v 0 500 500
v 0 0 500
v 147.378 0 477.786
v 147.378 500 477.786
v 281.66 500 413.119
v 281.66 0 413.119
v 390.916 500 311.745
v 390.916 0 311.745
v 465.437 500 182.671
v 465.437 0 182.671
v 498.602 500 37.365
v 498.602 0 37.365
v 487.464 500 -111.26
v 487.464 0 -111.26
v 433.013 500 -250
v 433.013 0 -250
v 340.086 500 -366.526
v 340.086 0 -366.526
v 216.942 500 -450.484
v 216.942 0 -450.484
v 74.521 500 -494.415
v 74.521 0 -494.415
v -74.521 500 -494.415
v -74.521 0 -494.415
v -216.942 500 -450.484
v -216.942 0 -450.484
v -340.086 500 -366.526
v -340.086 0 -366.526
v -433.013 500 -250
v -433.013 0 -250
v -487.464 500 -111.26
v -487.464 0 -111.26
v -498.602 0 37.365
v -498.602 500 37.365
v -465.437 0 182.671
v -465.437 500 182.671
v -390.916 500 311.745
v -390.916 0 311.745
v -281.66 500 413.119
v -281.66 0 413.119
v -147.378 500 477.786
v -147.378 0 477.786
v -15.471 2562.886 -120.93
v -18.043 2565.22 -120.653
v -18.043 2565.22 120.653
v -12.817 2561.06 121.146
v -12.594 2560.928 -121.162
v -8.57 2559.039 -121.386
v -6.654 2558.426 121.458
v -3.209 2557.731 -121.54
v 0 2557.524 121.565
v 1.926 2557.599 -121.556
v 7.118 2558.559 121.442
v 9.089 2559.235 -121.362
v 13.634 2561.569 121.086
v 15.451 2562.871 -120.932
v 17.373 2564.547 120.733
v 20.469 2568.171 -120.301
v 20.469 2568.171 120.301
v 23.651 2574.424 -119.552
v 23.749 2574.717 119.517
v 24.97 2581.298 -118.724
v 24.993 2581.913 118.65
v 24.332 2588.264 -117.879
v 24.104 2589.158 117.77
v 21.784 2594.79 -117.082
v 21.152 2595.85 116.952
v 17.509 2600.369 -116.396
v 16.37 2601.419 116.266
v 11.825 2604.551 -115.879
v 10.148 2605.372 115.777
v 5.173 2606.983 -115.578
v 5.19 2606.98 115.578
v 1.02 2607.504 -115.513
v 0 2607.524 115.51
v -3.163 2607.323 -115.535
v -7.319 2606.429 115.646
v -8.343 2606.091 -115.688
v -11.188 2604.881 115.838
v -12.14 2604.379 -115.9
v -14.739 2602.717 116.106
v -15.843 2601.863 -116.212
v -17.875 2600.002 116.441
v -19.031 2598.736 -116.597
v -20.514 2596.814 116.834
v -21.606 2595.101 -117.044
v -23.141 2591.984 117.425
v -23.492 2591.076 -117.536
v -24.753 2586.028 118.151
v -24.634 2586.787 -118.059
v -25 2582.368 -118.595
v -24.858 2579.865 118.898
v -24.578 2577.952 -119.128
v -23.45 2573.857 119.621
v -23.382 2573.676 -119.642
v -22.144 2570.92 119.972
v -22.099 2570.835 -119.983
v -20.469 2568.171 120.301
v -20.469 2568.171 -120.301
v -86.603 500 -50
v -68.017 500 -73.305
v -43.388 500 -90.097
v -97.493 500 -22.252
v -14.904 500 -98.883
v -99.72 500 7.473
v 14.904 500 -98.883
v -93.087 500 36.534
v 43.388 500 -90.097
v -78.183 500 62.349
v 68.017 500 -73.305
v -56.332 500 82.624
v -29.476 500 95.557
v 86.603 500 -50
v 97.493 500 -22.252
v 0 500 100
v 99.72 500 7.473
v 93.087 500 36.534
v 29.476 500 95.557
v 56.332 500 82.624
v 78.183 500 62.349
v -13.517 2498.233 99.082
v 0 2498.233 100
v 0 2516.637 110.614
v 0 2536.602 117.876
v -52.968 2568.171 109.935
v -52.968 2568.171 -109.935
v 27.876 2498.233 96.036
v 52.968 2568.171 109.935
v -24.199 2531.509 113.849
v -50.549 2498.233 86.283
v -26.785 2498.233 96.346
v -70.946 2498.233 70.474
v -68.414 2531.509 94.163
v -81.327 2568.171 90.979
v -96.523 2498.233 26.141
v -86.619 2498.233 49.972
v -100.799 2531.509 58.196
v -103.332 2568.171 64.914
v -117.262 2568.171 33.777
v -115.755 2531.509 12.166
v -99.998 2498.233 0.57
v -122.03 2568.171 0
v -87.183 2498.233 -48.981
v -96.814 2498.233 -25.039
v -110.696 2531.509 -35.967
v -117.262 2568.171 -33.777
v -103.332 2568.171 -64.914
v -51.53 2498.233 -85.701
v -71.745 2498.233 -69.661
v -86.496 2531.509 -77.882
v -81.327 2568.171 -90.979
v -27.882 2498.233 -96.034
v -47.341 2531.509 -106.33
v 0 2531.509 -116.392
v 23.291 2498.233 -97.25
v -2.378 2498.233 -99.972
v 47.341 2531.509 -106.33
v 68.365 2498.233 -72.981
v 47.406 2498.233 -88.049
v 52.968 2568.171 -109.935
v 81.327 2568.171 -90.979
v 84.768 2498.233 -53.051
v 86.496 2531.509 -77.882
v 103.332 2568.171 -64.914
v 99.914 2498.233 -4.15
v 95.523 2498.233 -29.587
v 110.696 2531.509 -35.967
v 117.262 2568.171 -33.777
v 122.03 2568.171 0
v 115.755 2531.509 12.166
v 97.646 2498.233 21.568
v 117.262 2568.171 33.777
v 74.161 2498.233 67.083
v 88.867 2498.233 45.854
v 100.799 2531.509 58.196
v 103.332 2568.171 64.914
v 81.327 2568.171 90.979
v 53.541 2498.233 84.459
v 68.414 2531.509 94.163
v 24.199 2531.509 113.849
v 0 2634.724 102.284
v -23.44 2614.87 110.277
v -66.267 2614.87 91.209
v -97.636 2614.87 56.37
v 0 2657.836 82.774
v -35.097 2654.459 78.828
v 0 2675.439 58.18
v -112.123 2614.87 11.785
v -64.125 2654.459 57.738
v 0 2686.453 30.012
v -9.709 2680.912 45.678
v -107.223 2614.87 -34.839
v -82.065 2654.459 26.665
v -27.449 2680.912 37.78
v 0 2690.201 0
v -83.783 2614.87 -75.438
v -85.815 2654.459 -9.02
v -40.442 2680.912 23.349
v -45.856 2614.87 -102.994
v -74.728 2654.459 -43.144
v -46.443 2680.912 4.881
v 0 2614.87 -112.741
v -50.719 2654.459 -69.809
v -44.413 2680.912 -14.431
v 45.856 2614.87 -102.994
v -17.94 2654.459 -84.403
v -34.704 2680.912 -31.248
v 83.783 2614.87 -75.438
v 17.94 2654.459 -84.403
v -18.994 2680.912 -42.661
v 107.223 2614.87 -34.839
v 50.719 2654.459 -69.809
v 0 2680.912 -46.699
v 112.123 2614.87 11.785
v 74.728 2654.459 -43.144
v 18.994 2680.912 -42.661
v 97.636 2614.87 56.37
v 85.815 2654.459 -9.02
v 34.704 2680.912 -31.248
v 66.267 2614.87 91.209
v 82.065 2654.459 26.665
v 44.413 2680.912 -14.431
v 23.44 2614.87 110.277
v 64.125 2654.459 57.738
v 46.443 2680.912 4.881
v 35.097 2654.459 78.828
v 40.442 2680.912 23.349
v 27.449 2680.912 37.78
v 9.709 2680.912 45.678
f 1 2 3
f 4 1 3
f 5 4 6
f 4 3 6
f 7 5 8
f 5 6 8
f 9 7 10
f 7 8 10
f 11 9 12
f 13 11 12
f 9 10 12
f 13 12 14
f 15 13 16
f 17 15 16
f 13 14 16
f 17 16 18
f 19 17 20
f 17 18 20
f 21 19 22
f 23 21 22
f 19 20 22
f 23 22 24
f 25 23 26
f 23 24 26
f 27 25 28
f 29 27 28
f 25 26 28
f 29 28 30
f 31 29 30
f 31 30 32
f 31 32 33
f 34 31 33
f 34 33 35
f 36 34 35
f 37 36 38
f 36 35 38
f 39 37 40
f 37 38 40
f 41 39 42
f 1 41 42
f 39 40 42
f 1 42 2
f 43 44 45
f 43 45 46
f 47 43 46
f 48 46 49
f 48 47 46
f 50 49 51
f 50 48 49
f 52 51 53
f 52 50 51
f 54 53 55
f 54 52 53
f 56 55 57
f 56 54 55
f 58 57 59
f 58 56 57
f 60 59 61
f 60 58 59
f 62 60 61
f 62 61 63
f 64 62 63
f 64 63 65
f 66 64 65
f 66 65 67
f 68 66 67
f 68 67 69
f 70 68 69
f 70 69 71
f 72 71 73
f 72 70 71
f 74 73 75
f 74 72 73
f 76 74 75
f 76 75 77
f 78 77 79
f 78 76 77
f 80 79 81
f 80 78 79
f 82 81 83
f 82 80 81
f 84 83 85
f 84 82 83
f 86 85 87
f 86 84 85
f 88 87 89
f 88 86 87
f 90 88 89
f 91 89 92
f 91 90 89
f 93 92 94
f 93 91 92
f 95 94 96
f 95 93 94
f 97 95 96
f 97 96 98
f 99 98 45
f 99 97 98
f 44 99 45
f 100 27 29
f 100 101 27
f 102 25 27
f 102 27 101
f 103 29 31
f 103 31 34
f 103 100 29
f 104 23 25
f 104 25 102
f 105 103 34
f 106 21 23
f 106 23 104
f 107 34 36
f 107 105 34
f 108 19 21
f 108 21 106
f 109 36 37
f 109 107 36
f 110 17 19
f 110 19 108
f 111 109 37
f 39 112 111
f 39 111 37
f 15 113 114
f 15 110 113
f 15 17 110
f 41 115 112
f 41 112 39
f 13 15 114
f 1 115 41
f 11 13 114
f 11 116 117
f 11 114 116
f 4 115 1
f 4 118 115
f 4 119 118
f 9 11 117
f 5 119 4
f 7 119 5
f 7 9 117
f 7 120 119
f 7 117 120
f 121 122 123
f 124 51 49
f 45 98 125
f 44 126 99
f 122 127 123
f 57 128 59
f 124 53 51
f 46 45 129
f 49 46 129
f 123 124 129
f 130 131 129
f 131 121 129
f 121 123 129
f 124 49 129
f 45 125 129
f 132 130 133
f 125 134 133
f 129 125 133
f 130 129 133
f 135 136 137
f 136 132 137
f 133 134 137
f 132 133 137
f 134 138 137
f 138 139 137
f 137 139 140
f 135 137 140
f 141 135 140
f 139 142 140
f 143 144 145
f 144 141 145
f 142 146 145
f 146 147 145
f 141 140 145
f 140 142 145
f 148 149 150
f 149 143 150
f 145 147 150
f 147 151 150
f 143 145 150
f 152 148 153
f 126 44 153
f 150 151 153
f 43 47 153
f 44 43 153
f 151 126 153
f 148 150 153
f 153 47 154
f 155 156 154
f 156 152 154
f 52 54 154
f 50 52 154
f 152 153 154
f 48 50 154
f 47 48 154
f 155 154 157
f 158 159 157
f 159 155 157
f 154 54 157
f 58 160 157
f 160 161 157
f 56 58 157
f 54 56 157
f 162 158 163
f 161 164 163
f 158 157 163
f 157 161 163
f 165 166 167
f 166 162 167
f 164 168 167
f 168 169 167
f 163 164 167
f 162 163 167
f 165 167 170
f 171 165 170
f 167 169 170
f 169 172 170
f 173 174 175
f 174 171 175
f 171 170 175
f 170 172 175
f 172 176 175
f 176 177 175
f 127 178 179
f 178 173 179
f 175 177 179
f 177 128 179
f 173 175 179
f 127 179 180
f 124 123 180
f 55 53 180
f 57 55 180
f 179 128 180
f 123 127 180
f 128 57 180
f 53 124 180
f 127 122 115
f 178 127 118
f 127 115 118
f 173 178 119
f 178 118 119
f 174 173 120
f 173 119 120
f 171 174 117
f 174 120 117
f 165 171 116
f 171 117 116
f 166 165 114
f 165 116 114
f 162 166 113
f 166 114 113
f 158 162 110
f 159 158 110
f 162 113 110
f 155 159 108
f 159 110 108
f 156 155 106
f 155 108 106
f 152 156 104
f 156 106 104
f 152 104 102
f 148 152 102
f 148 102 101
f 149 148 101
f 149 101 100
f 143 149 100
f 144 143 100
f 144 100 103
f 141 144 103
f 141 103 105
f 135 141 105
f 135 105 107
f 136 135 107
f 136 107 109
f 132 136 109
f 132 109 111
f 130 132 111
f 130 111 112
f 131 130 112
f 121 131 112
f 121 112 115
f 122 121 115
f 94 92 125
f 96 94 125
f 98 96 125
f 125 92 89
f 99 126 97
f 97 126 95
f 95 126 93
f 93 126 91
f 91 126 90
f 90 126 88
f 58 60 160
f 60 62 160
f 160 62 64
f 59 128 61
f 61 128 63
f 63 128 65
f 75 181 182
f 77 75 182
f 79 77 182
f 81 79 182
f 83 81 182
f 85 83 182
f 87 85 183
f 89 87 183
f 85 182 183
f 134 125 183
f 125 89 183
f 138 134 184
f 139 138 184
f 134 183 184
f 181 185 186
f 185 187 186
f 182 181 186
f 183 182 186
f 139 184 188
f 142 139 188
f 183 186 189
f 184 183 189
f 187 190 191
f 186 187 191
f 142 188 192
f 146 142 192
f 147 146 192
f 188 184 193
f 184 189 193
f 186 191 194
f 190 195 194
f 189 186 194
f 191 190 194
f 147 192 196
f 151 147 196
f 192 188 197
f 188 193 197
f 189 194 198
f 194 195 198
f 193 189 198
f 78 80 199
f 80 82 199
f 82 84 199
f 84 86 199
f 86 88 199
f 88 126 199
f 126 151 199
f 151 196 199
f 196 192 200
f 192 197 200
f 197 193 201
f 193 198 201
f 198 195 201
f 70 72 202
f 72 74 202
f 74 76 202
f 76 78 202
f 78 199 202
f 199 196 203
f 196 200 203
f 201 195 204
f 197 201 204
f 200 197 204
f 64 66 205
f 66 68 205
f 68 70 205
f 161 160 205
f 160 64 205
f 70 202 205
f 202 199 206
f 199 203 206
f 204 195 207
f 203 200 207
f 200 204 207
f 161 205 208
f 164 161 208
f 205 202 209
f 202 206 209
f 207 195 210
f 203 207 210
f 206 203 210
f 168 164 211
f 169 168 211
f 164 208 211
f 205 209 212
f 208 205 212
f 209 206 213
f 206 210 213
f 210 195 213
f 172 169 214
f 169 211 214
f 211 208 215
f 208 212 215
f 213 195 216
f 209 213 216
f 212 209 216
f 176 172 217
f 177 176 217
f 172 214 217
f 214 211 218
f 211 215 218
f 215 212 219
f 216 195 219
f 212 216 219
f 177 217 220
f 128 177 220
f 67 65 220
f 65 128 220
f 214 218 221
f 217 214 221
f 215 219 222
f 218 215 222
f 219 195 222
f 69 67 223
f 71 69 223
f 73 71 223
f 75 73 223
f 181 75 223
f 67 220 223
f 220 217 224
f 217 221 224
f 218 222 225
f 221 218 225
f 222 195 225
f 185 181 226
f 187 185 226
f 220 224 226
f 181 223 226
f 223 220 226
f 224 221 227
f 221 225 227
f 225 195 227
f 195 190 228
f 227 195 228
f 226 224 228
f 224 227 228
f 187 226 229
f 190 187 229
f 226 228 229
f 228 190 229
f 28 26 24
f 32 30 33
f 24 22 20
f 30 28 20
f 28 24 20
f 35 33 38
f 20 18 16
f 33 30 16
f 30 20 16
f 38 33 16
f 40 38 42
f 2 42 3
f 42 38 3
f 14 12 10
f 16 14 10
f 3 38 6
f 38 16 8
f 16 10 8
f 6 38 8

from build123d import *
from build123d.topology import SkipClean

# Parameters (mm, degrees)
SKETCH1_R               = 500
BOSS_EXTRUDE1_DEPTH     = 500
SKETCH2_R               = 100
BOSS_EXTRUDE2_DEPTH     = 2000
CUT_EXTRUDE1_DEPTH      = 164
CUT_EXTRUDE1_DEPTH_BACK = 147
SKETCH5_R               = 25


with BuildPart() as part:
    # Sketch1 → Boss-Extrude1 (new body)
    with BuildSketch(Plane(origin=(0, 0, 0), x_dir=(1, 0, 0), z_dir=(0, 1, 0))):
        with Locations(Location((0, 0, 0), (0, 0, 270))):
            Circle(SKETCH1_R)
    extrude(amount=BOSS_EXTRUDE1_DEPTH)

    # Sketch2 → Boss-Extrude2 (add)
    with BuildSketch(Plane(origin=(0, 500, 0), x_dir=(1, 0, 0), z_dir=(0, 1, 0))):
        with Locations(Location((0, 0, 0), (0, 0, 270))):
            Circle(SKETCH2_R)
    extrude(amount=BOSS_EXTRUDE2_DEPTH)

    # Sketch4 → Revolve3 (revolve)
    with SkipClean():  # the faces are left unmerged after this step: merging them gives an invalid solid
        with BuildSketch(Plane.XY, mode=Mode.PRIVATE) as revolve3_sk:
            with BuildLine():
                ThreePointArc((122.029891086, 2568.171222464), (86.288163494, 2654.459385958), (0, 2690.20111355))
                Line((0, 2690.20111355), (0, 2446.141331378))
                ThreePointArc((0, 2446.141331378), (86.288163494, 2481.883058969), (122.029891086, 2568.171222464))
            make_face()
            with BuildLine():
                Line((0, 2446.141331378), (0, 2690.20111355))
                ThreePointArc((0, 2690.20111355), (-122.029891086, 2568.171222464), (0, 2446.141331378))
            make_face()
        revolve(revolve3_sk.sketch.rotate(Axis((0, 2690.20111355, 0), (0, -1, 0)), 90), axis=Axis((0, 2690.20111355, 0), (0, -1, 0)))

    # Sketch5 → Cut-Extrude1 (cut, two sides: drawn at the far end of the back side and taken through both)
    with BuildSketch(Plane.XY.offset(-CUT_EXTRUDE1_DEPTH_BACK)):
        with Locations(Location((0, 2582.524351177, 0), (0, 0, 223.802603959))):
            Circle(SKETCH5_R)
    extrude(amount=CUT_EXTRUDE1_DEPTH + CUT_EXTRUDE1_DEPTH_BACK, mode=Mode.SUBTRACT)


solid = part.part
